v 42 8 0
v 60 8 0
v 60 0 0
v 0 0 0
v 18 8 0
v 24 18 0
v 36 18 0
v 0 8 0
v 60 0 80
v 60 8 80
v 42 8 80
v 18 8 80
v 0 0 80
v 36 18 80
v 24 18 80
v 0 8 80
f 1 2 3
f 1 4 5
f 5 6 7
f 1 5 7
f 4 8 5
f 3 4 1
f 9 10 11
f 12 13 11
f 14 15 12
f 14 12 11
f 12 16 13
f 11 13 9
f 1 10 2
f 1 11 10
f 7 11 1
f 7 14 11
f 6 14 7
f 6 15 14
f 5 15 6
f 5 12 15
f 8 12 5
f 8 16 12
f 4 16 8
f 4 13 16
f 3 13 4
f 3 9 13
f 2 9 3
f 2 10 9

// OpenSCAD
$fn = 32;

// ----------------------------------------------------------------------
// V guide rail: dovetail, 60 mm wide
// ----------------------------------------------------------------------

// --- parameters (mm) ---
rail_w = 60;              // rail width, X
base_t = 8;               // base plate thickness
v_depth = 10;             // V feature depth / height
v_half_w = 12;            // half width of the V at the base face
plate_t = 80;             // rail length, Z (the extrusion height)
top_half_w = 6;           // half width at the dovetail top

dovetail_base = 2 * v_half_w;  // dovetail width at the base
dovetail_top = 2 * top_half_w;  // dovetail width at the top

profile = [[0, 0], [60, 0], [60, 8], [42, 8], [36, 18], [24, 18], [18, 8], [0, 8]];  // primary outline, 8 points, counter clockwise

// --- the one profile operation ---
linear_extrude(height = plate_t) polygon(points = profile);
